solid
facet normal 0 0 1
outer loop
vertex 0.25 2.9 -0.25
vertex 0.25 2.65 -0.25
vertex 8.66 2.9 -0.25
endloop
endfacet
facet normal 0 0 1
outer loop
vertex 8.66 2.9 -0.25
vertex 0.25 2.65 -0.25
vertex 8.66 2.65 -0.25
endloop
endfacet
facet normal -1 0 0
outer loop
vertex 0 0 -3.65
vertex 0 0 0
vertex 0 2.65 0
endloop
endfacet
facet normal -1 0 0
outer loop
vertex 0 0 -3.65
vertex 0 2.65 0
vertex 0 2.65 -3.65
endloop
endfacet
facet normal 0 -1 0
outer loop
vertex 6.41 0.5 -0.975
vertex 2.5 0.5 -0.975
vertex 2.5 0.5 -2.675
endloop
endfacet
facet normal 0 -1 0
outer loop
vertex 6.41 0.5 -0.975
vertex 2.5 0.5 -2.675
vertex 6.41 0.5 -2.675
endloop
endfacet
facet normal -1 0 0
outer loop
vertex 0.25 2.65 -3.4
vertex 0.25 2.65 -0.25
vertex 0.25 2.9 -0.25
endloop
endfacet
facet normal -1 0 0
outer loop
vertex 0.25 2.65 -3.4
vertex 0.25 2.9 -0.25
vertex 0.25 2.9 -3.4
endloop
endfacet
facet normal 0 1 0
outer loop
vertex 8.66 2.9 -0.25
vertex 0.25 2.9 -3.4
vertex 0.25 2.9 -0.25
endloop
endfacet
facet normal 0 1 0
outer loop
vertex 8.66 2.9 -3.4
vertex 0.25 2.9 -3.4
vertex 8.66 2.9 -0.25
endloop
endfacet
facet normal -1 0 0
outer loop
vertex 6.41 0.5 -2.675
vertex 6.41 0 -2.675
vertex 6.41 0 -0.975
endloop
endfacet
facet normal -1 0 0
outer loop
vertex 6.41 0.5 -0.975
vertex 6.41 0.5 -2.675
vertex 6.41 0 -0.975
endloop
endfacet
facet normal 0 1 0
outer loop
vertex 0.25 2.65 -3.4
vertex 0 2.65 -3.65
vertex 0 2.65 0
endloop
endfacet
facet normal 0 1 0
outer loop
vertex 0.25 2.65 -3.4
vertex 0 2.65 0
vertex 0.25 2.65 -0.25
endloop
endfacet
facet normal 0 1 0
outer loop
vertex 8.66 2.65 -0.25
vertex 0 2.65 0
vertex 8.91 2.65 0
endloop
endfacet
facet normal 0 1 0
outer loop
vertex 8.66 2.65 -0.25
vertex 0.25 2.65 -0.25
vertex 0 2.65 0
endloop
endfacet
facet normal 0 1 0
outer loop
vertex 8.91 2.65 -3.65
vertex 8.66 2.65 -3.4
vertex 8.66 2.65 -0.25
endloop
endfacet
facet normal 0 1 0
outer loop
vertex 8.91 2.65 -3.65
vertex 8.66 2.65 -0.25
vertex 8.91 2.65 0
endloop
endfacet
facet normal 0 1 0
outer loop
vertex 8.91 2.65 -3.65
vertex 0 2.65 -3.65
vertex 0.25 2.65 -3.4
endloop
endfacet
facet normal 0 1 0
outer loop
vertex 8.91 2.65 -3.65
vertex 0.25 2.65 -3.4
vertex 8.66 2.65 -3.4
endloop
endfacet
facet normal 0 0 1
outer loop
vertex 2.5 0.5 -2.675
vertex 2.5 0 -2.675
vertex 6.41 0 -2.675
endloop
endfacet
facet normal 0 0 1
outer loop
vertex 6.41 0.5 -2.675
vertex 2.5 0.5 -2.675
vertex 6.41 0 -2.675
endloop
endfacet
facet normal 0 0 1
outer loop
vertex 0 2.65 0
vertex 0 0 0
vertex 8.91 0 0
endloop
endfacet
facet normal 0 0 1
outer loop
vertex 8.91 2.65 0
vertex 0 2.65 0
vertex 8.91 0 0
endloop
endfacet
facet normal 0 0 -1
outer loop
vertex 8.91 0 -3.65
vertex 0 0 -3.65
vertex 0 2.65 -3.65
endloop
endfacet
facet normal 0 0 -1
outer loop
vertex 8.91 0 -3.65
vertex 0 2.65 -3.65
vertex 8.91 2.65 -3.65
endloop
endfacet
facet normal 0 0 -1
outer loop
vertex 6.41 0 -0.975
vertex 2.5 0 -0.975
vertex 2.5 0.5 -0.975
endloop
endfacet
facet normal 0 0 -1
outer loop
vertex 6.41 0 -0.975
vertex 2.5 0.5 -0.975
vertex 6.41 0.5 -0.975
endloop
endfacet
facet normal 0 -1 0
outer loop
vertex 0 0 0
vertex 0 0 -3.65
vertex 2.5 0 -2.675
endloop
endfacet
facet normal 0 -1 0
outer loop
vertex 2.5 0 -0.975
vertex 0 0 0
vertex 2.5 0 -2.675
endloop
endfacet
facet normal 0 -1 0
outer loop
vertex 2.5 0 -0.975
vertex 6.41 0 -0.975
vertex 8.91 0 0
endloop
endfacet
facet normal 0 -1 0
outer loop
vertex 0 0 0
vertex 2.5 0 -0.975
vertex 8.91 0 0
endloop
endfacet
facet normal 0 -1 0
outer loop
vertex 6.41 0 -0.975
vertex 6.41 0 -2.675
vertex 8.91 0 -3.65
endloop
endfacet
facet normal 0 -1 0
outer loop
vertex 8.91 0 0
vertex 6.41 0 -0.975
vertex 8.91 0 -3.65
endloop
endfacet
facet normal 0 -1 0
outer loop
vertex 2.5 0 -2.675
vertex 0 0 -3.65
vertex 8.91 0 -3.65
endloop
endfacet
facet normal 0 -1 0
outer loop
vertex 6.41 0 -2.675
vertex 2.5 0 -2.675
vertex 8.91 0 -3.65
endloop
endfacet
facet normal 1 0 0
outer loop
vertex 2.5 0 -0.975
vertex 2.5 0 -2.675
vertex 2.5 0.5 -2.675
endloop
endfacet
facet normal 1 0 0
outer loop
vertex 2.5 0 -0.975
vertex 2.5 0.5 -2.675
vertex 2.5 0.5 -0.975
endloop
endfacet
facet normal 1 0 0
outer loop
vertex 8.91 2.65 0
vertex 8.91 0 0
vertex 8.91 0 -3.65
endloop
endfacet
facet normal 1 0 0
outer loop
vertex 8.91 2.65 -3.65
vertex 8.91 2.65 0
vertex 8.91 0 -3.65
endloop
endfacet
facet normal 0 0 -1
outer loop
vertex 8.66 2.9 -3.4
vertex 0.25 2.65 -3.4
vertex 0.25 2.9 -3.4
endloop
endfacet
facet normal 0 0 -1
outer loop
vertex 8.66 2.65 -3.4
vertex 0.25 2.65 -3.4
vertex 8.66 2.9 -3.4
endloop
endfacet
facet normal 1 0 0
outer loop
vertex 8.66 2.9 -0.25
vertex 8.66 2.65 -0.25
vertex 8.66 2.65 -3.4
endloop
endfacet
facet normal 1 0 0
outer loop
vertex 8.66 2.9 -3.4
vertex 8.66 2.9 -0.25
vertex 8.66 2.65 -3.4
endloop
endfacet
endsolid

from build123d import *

# Parameters (mm, degrees)
SKETCH1_W          = 8.91
SKETCH1_H          = 3.65
MAIN_SHAPE_DEPTH   = 2.65
SKETCH2_W          = 8.41
SKETCH2_H          = 3.15
BOTTOM_BASE_DEPTH  = 0.25
SWITCH_HOLE_W      = 3.91
SWITCH_HOLE_H      = 1.7
CUT_EXTRUDE1_DEPTH = 0.5


with BuildPart() as part:
    # Sketch1 → main shape (new body)
    with BuildSketch(Plane(origin=(0, 0, 0), x_dir=(1, 0, 0), z_dir=(0, 1, 0))):
        with Locations((4.455, 1.825)):
            Rectangle(SKETCH1_W, SKETCH1_H)
    extrude(amount=MAIN_SHAPE_DEPTH)

    # Sketch2 → bottom base (add)
    with BuildSketch(Plane(origin=(0, 2.65, 0), x_dir=(1, 0, 0), z_dir=(0, 1, 0))):
        with Locations((4.455, 1.825)):
            Rectangle(SKETCH2_W, SKETCH2_H)
    extrude(amount=BOTTOM_BASE_DEPTH)

    # switch hole → Cut-Extrude1 (cut)
    with BuildSketch(Plane.XZ):
        with Locations((4.455, -1.825)):
            Rectangle(SWITCH_HOLE_W, SWITCH_HOLE_H)
    extrude(amount=-CUT_EXTRUDE1_DEPTH, mode=Mode.SUBTRACT)


solid = part.part
